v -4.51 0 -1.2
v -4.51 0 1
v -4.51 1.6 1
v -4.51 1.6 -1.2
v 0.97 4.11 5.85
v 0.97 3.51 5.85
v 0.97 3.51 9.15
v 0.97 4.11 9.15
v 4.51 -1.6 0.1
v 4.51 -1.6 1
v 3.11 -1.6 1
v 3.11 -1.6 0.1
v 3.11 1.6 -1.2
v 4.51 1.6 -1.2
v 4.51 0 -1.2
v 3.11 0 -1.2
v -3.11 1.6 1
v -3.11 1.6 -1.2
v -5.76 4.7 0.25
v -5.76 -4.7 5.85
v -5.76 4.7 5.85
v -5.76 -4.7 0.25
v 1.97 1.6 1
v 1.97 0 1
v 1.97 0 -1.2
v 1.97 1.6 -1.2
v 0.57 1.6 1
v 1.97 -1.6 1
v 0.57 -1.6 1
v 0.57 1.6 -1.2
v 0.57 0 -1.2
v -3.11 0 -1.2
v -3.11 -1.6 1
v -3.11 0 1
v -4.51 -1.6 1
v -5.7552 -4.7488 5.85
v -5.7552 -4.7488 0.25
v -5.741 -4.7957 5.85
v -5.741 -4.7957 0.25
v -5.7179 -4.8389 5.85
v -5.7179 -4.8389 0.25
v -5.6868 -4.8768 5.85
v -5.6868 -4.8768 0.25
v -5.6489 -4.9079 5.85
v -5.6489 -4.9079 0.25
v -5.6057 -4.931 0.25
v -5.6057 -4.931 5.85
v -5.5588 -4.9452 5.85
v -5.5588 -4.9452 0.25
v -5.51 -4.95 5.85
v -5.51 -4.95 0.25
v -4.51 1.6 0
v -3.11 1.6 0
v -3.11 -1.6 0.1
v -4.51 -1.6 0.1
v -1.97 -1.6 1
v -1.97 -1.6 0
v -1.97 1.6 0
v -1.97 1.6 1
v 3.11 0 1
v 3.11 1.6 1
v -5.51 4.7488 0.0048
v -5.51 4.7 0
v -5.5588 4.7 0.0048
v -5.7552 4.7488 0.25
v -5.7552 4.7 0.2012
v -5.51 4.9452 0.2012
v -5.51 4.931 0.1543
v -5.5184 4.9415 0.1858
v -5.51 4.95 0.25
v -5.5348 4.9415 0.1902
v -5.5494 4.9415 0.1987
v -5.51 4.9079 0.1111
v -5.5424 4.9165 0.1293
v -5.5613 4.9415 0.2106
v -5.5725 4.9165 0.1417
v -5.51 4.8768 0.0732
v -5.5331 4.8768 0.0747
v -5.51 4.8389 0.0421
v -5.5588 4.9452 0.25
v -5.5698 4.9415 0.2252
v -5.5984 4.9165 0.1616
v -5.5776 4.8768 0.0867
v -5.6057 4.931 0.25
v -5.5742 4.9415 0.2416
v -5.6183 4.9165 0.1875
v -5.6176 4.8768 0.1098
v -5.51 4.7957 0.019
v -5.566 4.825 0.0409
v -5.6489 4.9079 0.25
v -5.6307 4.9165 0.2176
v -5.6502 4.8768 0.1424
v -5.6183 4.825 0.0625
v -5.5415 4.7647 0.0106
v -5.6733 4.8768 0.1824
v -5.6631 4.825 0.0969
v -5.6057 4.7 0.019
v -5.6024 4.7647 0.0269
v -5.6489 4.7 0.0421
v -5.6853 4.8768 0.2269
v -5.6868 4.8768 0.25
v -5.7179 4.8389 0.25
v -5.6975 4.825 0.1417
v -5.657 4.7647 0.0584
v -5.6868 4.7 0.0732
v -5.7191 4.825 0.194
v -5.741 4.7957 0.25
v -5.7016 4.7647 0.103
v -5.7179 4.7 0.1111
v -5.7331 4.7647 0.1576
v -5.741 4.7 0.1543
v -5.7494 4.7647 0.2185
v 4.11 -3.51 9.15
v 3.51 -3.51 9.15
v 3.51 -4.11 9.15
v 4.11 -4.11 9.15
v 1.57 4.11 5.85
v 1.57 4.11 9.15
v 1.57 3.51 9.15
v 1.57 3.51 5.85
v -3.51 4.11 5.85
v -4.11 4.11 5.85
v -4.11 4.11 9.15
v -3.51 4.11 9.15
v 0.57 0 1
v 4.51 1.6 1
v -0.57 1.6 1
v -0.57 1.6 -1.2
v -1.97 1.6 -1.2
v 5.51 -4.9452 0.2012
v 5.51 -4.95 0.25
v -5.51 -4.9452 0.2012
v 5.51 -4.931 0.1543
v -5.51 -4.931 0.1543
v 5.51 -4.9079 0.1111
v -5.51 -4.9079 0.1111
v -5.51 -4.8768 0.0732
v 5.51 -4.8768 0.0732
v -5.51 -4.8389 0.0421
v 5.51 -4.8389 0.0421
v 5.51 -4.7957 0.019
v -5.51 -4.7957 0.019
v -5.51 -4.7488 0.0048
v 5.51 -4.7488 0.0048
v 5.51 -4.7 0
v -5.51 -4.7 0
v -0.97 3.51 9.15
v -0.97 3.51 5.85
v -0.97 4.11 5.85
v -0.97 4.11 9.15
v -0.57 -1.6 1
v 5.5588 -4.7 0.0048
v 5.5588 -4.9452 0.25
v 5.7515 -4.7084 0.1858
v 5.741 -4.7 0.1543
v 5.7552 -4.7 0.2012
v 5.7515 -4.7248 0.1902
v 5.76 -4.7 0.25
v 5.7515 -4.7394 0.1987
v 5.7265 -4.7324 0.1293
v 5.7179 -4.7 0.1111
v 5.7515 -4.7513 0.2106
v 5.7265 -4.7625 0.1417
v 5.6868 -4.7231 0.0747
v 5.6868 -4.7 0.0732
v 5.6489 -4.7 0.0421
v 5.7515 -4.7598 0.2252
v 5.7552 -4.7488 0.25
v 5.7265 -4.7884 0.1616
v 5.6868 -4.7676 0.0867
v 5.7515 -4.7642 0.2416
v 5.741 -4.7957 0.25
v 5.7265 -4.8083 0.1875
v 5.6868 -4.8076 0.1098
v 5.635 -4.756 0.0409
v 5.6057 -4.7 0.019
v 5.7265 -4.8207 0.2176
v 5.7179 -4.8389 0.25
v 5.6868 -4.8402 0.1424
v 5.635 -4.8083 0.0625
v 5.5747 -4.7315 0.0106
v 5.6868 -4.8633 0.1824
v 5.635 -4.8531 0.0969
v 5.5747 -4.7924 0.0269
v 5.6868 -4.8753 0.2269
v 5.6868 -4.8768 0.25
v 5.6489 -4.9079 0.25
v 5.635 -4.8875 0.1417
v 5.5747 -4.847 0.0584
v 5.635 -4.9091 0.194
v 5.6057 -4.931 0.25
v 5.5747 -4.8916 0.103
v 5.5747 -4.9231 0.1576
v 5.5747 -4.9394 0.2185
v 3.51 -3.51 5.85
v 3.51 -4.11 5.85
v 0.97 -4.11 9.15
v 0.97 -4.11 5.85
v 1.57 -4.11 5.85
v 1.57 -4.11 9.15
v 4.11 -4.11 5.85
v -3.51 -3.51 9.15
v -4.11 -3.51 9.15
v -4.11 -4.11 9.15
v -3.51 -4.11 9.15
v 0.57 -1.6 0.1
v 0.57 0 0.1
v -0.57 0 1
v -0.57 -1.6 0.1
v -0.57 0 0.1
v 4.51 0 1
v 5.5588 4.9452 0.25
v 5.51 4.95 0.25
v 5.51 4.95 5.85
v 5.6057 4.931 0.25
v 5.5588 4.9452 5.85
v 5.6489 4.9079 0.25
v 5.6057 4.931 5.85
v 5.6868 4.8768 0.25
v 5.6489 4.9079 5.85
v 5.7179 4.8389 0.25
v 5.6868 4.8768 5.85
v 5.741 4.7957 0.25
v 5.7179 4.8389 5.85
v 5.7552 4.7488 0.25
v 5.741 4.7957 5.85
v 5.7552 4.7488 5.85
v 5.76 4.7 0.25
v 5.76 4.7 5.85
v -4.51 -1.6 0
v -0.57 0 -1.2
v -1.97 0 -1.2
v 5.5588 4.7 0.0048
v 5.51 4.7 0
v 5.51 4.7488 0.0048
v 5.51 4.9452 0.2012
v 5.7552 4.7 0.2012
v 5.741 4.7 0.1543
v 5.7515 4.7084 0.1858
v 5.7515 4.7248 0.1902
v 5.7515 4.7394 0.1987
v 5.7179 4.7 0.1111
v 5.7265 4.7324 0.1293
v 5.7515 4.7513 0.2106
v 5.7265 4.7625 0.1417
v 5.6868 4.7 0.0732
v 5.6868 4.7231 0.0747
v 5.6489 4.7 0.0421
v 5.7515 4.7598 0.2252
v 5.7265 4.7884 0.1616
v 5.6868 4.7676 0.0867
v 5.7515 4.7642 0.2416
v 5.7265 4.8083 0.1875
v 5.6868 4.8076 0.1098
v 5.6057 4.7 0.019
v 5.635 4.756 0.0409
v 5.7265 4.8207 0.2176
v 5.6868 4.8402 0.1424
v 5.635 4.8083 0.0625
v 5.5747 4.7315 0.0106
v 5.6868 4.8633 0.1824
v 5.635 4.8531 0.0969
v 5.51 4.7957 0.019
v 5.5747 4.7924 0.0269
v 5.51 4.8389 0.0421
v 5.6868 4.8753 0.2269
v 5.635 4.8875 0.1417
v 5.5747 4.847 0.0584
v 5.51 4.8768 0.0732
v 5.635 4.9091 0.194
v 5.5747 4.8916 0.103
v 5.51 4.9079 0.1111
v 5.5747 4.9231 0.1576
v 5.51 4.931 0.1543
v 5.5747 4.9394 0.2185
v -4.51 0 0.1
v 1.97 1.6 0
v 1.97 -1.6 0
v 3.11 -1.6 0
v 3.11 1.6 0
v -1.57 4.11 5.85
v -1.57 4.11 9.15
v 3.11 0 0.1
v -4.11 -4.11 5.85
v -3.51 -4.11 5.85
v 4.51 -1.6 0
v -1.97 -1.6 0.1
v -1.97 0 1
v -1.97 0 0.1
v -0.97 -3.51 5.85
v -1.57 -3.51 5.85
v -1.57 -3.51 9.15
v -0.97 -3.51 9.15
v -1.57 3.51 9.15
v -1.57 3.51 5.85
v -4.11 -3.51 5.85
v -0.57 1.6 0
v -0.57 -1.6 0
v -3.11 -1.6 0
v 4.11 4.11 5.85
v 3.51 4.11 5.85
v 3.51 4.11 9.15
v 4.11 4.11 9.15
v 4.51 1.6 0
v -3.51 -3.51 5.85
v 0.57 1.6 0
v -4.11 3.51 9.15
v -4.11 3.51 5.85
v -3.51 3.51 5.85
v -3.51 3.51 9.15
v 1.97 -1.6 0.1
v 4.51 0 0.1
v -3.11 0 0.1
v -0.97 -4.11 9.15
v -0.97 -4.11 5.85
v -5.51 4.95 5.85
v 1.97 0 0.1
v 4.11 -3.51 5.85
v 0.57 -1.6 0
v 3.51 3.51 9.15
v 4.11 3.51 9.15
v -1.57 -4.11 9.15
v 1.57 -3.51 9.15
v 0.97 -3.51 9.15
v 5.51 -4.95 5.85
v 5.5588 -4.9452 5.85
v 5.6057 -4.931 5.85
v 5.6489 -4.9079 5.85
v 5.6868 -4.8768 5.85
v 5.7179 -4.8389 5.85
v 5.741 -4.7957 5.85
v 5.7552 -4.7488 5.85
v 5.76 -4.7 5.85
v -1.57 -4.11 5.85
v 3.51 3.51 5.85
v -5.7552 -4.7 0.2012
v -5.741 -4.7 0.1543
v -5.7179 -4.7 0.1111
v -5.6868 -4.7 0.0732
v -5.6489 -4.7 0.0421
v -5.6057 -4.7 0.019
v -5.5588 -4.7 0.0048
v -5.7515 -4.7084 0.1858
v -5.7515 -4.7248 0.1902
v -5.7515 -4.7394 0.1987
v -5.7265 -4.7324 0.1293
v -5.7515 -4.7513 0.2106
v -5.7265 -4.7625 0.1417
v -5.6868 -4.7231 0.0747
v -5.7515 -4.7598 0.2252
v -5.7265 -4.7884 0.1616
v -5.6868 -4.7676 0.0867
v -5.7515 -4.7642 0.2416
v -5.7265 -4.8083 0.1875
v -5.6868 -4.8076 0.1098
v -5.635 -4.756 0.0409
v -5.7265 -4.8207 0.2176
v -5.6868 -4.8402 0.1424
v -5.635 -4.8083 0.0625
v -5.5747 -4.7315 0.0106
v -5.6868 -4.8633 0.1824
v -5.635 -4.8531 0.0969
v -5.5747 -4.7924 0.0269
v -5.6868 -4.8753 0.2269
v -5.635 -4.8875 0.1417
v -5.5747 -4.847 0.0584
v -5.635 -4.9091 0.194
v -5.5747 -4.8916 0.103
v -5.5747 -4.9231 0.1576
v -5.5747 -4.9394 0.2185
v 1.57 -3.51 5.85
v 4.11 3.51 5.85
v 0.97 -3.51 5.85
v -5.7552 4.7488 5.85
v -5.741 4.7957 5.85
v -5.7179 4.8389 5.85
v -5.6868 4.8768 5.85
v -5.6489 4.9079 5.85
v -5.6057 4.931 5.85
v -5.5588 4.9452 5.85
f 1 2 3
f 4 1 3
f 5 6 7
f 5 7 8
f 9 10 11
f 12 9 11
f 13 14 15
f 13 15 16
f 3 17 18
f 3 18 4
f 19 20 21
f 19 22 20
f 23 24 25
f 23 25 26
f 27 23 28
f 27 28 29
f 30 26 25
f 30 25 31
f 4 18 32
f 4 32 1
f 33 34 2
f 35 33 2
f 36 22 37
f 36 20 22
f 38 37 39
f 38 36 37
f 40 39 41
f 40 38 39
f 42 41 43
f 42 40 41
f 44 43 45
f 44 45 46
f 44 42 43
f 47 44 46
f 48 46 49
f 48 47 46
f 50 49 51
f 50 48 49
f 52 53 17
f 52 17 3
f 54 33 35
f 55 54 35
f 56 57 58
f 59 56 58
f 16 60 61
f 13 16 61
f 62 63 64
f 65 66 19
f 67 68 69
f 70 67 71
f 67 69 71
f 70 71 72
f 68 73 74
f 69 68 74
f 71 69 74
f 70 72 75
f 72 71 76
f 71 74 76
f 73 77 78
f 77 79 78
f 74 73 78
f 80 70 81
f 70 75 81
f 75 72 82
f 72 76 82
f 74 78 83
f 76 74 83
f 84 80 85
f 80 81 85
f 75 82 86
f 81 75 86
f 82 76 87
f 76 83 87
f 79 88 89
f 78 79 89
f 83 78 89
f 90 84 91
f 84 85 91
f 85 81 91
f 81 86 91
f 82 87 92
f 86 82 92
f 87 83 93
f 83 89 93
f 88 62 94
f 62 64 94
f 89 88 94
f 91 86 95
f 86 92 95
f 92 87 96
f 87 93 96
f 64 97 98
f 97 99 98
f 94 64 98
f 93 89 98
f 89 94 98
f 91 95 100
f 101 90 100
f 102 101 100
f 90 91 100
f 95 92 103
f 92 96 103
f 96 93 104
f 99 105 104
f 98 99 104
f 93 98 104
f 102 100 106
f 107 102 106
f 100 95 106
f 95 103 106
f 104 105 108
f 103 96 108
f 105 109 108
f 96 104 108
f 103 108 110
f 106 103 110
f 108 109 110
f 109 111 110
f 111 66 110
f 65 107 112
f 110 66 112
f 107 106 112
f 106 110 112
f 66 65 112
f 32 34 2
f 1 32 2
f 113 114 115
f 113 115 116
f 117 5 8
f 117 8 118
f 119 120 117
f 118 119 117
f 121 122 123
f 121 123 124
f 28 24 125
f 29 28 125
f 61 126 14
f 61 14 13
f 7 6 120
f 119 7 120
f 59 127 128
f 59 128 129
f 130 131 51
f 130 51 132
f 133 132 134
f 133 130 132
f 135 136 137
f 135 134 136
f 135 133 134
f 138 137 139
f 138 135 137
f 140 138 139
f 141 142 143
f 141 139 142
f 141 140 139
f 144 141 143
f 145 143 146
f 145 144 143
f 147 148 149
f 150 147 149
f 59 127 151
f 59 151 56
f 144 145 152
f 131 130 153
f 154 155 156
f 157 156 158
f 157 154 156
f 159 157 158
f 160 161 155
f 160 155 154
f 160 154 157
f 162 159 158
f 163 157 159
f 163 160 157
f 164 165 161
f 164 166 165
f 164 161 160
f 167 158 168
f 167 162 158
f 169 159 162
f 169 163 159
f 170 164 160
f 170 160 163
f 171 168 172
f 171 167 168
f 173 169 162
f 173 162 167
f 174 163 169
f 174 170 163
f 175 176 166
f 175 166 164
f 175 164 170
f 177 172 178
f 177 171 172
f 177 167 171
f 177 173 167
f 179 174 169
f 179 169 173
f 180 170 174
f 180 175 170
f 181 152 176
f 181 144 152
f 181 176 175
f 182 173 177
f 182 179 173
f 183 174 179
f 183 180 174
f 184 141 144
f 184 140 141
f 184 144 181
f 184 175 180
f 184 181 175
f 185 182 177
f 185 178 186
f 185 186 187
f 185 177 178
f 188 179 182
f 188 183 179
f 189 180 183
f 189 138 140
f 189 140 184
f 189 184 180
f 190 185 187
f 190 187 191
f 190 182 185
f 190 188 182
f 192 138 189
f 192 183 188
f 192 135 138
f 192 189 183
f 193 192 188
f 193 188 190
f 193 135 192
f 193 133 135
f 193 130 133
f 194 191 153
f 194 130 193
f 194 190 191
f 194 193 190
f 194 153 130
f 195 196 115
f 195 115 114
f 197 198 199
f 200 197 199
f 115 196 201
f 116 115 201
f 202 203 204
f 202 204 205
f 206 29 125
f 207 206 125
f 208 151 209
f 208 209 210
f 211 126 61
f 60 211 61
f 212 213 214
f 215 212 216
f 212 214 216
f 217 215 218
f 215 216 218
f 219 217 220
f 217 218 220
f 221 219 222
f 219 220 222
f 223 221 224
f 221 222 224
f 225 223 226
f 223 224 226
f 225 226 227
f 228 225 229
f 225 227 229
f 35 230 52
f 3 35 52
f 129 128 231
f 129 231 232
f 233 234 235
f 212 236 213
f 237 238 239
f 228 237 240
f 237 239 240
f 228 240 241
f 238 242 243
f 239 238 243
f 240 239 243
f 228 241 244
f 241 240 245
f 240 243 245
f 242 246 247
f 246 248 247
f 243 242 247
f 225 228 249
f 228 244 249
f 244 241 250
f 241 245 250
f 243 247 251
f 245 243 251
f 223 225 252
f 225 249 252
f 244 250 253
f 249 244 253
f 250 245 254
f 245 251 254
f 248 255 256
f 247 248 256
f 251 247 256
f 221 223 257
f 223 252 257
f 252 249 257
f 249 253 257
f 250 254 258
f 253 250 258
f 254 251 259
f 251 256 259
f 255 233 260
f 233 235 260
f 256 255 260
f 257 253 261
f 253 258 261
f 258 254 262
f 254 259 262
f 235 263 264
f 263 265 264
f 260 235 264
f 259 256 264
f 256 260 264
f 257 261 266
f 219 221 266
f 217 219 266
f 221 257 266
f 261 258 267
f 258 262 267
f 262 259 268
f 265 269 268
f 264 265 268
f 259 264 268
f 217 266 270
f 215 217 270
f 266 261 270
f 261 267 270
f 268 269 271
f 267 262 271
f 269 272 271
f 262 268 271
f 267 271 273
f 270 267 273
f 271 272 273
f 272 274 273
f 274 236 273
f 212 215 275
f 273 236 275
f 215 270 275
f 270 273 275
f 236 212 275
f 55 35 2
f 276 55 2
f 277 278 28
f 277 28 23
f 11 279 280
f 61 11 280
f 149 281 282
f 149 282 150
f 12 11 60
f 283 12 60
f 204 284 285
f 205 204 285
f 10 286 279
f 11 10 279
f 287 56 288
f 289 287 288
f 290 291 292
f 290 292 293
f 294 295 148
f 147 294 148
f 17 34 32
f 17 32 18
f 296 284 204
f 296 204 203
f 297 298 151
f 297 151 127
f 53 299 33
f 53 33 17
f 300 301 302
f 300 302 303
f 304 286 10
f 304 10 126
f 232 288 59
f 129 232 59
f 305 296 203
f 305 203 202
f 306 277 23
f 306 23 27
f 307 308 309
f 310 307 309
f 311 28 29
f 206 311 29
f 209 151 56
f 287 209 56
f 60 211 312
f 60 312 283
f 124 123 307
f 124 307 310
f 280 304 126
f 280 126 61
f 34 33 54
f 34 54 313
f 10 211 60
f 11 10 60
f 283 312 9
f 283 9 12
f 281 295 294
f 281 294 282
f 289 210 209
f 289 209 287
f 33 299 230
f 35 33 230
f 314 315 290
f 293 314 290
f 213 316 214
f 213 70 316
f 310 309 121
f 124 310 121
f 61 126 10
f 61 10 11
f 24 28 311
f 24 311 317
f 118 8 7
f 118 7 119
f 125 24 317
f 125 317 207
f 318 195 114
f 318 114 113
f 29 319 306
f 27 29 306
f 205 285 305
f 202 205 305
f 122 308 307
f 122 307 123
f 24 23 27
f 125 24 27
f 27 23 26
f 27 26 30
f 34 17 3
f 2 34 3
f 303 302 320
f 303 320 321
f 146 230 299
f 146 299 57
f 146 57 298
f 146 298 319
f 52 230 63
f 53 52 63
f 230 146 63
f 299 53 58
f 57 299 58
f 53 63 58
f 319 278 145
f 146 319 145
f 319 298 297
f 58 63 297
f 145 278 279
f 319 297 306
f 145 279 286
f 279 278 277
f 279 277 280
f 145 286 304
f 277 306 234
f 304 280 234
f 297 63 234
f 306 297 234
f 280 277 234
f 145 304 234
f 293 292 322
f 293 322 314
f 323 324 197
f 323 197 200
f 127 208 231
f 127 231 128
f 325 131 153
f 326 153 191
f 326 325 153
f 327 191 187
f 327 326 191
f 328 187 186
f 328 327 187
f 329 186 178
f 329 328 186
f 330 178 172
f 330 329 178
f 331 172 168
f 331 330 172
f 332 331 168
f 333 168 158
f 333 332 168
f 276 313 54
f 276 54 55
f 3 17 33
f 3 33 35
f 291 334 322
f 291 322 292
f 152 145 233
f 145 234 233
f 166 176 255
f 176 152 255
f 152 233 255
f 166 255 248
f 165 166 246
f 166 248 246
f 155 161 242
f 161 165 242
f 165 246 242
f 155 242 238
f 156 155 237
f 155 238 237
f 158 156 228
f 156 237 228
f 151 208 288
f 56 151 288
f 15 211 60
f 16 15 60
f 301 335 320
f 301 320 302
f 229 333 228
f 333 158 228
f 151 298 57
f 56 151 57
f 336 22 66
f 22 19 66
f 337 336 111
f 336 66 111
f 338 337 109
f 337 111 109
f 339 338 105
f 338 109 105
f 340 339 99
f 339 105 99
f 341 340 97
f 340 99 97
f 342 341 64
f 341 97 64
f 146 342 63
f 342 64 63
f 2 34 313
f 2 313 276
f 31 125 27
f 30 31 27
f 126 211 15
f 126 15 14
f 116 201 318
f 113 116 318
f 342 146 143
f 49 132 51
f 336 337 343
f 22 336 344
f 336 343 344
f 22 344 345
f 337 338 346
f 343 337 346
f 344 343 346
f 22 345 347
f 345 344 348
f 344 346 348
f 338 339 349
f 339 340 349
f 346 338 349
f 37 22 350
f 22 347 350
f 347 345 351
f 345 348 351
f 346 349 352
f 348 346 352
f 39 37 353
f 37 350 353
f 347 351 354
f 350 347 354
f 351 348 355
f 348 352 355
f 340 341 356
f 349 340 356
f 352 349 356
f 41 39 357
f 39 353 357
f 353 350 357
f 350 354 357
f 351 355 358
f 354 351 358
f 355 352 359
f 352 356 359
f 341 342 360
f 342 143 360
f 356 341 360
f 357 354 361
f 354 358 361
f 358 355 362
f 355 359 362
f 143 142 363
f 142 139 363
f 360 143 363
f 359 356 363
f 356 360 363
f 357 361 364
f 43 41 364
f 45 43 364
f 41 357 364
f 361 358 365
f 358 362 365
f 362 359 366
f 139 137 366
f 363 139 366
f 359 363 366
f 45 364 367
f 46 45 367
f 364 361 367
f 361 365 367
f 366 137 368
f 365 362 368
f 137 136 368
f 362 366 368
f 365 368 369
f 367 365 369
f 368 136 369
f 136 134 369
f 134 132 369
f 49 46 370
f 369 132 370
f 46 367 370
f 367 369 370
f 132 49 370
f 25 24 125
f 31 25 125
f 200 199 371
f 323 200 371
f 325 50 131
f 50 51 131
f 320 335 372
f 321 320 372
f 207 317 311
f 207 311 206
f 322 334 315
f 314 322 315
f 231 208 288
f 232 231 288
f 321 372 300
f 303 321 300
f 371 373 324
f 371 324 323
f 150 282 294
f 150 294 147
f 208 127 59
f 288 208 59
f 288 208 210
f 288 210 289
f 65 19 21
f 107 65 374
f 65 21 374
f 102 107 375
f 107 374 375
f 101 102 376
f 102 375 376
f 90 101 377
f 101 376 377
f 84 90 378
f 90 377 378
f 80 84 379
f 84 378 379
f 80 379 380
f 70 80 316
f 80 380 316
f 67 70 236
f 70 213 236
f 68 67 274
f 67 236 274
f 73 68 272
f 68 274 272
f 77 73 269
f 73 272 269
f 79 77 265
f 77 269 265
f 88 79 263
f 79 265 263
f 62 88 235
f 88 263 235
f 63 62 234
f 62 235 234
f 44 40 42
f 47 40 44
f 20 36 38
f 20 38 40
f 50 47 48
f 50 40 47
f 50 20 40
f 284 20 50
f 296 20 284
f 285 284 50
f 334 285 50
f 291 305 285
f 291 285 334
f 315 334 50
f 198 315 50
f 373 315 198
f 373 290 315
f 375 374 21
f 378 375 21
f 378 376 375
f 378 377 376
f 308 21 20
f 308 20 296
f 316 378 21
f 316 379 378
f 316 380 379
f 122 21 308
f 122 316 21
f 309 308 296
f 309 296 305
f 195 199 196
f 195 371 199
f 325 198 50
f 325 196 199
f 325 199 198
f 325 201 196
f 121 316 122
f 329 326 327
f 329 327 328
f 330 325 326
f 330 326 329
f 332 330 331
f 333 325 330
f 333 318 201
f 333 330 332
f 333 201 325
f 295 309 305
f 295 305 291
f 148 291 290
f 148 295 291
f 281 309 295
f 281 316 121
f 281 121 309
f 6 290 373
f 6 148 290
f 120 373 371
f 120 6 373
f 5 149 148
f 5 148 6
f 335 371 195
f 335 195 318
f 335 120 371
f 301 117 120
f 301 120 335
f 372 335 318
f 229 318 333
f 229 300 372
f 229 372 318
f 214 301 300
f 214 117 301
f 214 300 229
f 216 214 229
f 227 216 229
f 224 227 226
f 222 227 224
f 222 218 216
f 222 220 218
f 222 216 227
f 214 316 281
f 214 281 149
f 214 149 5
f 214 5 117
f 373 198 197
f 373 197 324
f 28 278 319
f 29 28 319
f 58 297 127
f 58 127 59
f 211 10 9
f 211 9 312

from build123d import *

# Parameters (mm, degrees)
IZIM1_W                       = 11.52
IZIM1_H                       = 9.9
Y_KSEKLIK_EKSTR_ZYON1_DEPTH   = 5.85
IZIM2_W                       = 1.4
IZIM2_H                       = 3.2
KES_EKSTR_ZYON1_DEPTH         = 1
IZIM4_W                       = 1.4
IZIM4_H                       = 1.6
Y_KSEKLIK_EKSTR_ZYON2_DEPTH   = 2.2
Y_KSEKLIK_EKSTR_ZYON2_2_DEPTH = 2.2
Y_KSEKLIK_EKSTR_ZYON2_3_DEPTH = 2.2
Y_KSEKLIK_EKSTR_ZYON2_4_DEPTH = 2.2
IZIM5_W                       = 1.4
IZIM5_H                       = 1.6
Y_KSEKLIK_EKSTR_ZYON3_DEPTH   = 0.9
Y_KSEKLIK_EKSTR_ZYON3_2_DEPTH = 0.9
Y_KSEKLIK_EKSTR_ZYON3_3_DEPTH = 0.9
Y_KSEKLIK_EKSTR_ZYON3_4_DEPTH = 0.9
RADYUS1_R                     = 0.25
IZIM6_W                       = 0.6
IZIM6_H                       = 0.6
Y_KSEKLIK_EKSTR_ZYON4_DEPTH   = 3.3


with BuildPart() as part:
    # Çizim1 → Yükseklik-Ekstrüzyon1 (new body)
    with BuildSketch(Plane.XY):
        Rectangle(IZIM1_W, IZIM1_H)
    extrude(amount=Y_KSEKLIK_EKSTR_ZYON1_DEPTH)

    # Çizim2 → Kes-Ekstrüzyon1 (cut)
    with BuildSketch(Plane(origin=(0, 0, 0), x_dir=(-1, 0, 0), z_dir=(0, 0, -1))):
        with Locations((3.81, 0)):
            Rectangle(IZIM2_W, IZIM2_H)
        with Locations((1.27, 0)):
            Rectangle(IZIM2_W, IZIM2_H)
        with Locations((-1.27, 0)):
            Rectangle(IZIM2_W, IZIM2_H)
        with Locations((-3.81, 0)):
            Rectangle(IZIM2_W, IZIM2_H)
    extrude(amount=-KES_EKSTR_ZYON1_DEPTH, mode=Mode.SUBTRACT)

    # Radyus1
    radyus1_edges = [part.edges().sort_by_distance(p)[0] for p in [
        (0, -4.95, 0),
        (-5.76, 0, 0),
        (0, 4.95, 0),
        (5.76, 0, 0),
        (5.76, -4.95, 2.925),
        (-5.76, -4.95, 2.925),
        (-5.76, 4.95, 2.925),
        (5.76, 4.95, 2.925),
    ]]
    fillet(radyus1_edges, radius=RADYUS1_R)

    # Çizim6 → Yükseklik-Ekstrüzyon4 (add)
    with BuildSketch(Plane.XY.offset(5.85)):
        with Locations((3.81, 3.81)):
            Rectangle(IZIM6_W, IZIM6_H)
        with Locations((1.27, 3.81)):
            Rectangle(IZIM6_W, IZIM6_H)
        with Locations((-1.27, 3.81)):
            Rectangle(IZIM6_W, IZIM6_H)
        with Locations((-3.81, 3.81)):
            Rectangle(IZIM6_W, IZIM6_H)
        with Locations((3.81, -3.81)):
            Rectangle(IZIM6_W, IZIM6_H)
        with Locations((1.27, -3.81)):
            Rectangle(IZIM6_W, IZIM6_H)
        with Locations((-1.27, -3.81)):
            Rectangle(IZIM6_W, IZIM6_H)
        with Locations((-3.81, -3.81)):
            Rectangle(IZIM6_W, IZIM6_H)
    extrude(amount=Y_KSEKLIK_EKSTR_ZYON4_DEPTH)


with BuildPart() as body_2:
    # Çizim4 → Yükseklik-Ekstrüzyon2 (new body)
    with BuildSketch(Plane(origin=(0, 0, 1), x_dir=(-1, 0, 0), z_dir=(0, 0, -1))):
        with Locations((3.81, 0.8)):
            Rectangle(IZIM4_W, IZIM4_H)
    extrude(amount=Y_KSEKLIK_EKSTR_ZYON2_DEPTH)


with BuildPart() as body_3:
    # Çizim4 → Y_kseklik-Ekstr_zyon2 2 (new body)
    with BuildSketch(Plane(origin=(0, 0, 1), x_dir=(-1, 0, 0), z_dir=(0, 0, -1))):
        with Locations((1.27, 0.8)):
            Rectangle(IZIM4_W, IZIM4_H)
    extrude(amount=Y_KSEKLIK_EKSTR_ZYON2_2_DEPTH)


with BuildPart() as body_4:
    # Çizim4 → Y_kseklik-Ekstr_zyon2 3 (new body)
    with BuildSketch(Plane(origin=(0, 0, 1), x_dir=(-1, 0, 0), z_dir=(0, 0, -1))):
        with Locations((-1.27, 0.8)):
            Rectangle(IZIM4_W, IZIM4_H)
    extrude(amount=Y_KSEKLIK_EKSTR_ZYON2_3_DEPTH)


with BuildPart() as body_5:
    # Çizim4 → Y_kseklik-Ekstr_zyon2 4 (new body)
    with BuildSketch(Plane(origin=(0, 0, 1), x_dir=(-1, 0, 0), z_dir=(0, 0, -1))):
        with Locations((-3.81, 0.8)):
            Rectangle(IZIM4_W, IZIM4_H)
    extrude(amount=Y_KSEKLIK_EKSTR_ZYON2_4_DEPTH)


with BuildPart() as body_6:
    # Çizim5 → Yükseklik-Ekstrüzyon3 (new body)
    with BuildSketch(Plane(origin=(0, 0, 1), x_dir=(-1, 0, 0), z_dir=(0, 0, -1))):
        with Locations((-3.81, -0.8)):
            Rectangle(IZIM5_W, IZIM5_H)
    extrude(amount=Y_KSEKLIK_EKSTR_ZYON3_DEPTH)


with BuildPart() as body_7:
    # Çizim5 → Y_kseklik-Ekstr_zyon3 2 (new body)
    with BuildSketch(Plane(origin=(0, 0, 1), x_dir=(-1, 0, 0), z_dir=(0, 0, -1))):
        with Locations((-1.27, -0.8)):
            Rectangle(IZIM5_W, IZIM5_H)
    extrude(amount=Y_KSEKLIK_EKSTR_ZYON3_2_DEPTH)


with BuildPart() as body_8:
    # Çizim5 → Y_kseklik-Ekstr_zyon3 3 (new body)
    with BuildSketch(Plane(origin=(0, 0, 1), x_dir=(-1, 0, 0), z_dir=(0, 0, -1))):
        with Locations((1.27, -0.8)):
            Rectangle(IZIM5_W, IZIM5_H)
    extrude(amount=Y_KSEKLIK_EKSTR_ZYON3_3_DEPTH)


with BuildPart() as body_9:
    # Çizim5 → Y_kseklik-Ekstr_zyon3 4 (new body)
    with BuildSketch(Plane(origin=(0, 0, 1), x_dir=(-1, 0, 0), z_dir=(0, 0, -1))):
        with Locations((3.81, -0.8)):
            Rectangle(IZIM5_W, IZIM5_H)
    extrude(amount=Y_KSEKLIK_EKSTR_ZYON3_4_DEPTH)


solid = Compound([part.part, body_2.part, body_3.part, body_4.part, body_5.part, body_6.part, body_7.part, body_8.part, body_9.part])
